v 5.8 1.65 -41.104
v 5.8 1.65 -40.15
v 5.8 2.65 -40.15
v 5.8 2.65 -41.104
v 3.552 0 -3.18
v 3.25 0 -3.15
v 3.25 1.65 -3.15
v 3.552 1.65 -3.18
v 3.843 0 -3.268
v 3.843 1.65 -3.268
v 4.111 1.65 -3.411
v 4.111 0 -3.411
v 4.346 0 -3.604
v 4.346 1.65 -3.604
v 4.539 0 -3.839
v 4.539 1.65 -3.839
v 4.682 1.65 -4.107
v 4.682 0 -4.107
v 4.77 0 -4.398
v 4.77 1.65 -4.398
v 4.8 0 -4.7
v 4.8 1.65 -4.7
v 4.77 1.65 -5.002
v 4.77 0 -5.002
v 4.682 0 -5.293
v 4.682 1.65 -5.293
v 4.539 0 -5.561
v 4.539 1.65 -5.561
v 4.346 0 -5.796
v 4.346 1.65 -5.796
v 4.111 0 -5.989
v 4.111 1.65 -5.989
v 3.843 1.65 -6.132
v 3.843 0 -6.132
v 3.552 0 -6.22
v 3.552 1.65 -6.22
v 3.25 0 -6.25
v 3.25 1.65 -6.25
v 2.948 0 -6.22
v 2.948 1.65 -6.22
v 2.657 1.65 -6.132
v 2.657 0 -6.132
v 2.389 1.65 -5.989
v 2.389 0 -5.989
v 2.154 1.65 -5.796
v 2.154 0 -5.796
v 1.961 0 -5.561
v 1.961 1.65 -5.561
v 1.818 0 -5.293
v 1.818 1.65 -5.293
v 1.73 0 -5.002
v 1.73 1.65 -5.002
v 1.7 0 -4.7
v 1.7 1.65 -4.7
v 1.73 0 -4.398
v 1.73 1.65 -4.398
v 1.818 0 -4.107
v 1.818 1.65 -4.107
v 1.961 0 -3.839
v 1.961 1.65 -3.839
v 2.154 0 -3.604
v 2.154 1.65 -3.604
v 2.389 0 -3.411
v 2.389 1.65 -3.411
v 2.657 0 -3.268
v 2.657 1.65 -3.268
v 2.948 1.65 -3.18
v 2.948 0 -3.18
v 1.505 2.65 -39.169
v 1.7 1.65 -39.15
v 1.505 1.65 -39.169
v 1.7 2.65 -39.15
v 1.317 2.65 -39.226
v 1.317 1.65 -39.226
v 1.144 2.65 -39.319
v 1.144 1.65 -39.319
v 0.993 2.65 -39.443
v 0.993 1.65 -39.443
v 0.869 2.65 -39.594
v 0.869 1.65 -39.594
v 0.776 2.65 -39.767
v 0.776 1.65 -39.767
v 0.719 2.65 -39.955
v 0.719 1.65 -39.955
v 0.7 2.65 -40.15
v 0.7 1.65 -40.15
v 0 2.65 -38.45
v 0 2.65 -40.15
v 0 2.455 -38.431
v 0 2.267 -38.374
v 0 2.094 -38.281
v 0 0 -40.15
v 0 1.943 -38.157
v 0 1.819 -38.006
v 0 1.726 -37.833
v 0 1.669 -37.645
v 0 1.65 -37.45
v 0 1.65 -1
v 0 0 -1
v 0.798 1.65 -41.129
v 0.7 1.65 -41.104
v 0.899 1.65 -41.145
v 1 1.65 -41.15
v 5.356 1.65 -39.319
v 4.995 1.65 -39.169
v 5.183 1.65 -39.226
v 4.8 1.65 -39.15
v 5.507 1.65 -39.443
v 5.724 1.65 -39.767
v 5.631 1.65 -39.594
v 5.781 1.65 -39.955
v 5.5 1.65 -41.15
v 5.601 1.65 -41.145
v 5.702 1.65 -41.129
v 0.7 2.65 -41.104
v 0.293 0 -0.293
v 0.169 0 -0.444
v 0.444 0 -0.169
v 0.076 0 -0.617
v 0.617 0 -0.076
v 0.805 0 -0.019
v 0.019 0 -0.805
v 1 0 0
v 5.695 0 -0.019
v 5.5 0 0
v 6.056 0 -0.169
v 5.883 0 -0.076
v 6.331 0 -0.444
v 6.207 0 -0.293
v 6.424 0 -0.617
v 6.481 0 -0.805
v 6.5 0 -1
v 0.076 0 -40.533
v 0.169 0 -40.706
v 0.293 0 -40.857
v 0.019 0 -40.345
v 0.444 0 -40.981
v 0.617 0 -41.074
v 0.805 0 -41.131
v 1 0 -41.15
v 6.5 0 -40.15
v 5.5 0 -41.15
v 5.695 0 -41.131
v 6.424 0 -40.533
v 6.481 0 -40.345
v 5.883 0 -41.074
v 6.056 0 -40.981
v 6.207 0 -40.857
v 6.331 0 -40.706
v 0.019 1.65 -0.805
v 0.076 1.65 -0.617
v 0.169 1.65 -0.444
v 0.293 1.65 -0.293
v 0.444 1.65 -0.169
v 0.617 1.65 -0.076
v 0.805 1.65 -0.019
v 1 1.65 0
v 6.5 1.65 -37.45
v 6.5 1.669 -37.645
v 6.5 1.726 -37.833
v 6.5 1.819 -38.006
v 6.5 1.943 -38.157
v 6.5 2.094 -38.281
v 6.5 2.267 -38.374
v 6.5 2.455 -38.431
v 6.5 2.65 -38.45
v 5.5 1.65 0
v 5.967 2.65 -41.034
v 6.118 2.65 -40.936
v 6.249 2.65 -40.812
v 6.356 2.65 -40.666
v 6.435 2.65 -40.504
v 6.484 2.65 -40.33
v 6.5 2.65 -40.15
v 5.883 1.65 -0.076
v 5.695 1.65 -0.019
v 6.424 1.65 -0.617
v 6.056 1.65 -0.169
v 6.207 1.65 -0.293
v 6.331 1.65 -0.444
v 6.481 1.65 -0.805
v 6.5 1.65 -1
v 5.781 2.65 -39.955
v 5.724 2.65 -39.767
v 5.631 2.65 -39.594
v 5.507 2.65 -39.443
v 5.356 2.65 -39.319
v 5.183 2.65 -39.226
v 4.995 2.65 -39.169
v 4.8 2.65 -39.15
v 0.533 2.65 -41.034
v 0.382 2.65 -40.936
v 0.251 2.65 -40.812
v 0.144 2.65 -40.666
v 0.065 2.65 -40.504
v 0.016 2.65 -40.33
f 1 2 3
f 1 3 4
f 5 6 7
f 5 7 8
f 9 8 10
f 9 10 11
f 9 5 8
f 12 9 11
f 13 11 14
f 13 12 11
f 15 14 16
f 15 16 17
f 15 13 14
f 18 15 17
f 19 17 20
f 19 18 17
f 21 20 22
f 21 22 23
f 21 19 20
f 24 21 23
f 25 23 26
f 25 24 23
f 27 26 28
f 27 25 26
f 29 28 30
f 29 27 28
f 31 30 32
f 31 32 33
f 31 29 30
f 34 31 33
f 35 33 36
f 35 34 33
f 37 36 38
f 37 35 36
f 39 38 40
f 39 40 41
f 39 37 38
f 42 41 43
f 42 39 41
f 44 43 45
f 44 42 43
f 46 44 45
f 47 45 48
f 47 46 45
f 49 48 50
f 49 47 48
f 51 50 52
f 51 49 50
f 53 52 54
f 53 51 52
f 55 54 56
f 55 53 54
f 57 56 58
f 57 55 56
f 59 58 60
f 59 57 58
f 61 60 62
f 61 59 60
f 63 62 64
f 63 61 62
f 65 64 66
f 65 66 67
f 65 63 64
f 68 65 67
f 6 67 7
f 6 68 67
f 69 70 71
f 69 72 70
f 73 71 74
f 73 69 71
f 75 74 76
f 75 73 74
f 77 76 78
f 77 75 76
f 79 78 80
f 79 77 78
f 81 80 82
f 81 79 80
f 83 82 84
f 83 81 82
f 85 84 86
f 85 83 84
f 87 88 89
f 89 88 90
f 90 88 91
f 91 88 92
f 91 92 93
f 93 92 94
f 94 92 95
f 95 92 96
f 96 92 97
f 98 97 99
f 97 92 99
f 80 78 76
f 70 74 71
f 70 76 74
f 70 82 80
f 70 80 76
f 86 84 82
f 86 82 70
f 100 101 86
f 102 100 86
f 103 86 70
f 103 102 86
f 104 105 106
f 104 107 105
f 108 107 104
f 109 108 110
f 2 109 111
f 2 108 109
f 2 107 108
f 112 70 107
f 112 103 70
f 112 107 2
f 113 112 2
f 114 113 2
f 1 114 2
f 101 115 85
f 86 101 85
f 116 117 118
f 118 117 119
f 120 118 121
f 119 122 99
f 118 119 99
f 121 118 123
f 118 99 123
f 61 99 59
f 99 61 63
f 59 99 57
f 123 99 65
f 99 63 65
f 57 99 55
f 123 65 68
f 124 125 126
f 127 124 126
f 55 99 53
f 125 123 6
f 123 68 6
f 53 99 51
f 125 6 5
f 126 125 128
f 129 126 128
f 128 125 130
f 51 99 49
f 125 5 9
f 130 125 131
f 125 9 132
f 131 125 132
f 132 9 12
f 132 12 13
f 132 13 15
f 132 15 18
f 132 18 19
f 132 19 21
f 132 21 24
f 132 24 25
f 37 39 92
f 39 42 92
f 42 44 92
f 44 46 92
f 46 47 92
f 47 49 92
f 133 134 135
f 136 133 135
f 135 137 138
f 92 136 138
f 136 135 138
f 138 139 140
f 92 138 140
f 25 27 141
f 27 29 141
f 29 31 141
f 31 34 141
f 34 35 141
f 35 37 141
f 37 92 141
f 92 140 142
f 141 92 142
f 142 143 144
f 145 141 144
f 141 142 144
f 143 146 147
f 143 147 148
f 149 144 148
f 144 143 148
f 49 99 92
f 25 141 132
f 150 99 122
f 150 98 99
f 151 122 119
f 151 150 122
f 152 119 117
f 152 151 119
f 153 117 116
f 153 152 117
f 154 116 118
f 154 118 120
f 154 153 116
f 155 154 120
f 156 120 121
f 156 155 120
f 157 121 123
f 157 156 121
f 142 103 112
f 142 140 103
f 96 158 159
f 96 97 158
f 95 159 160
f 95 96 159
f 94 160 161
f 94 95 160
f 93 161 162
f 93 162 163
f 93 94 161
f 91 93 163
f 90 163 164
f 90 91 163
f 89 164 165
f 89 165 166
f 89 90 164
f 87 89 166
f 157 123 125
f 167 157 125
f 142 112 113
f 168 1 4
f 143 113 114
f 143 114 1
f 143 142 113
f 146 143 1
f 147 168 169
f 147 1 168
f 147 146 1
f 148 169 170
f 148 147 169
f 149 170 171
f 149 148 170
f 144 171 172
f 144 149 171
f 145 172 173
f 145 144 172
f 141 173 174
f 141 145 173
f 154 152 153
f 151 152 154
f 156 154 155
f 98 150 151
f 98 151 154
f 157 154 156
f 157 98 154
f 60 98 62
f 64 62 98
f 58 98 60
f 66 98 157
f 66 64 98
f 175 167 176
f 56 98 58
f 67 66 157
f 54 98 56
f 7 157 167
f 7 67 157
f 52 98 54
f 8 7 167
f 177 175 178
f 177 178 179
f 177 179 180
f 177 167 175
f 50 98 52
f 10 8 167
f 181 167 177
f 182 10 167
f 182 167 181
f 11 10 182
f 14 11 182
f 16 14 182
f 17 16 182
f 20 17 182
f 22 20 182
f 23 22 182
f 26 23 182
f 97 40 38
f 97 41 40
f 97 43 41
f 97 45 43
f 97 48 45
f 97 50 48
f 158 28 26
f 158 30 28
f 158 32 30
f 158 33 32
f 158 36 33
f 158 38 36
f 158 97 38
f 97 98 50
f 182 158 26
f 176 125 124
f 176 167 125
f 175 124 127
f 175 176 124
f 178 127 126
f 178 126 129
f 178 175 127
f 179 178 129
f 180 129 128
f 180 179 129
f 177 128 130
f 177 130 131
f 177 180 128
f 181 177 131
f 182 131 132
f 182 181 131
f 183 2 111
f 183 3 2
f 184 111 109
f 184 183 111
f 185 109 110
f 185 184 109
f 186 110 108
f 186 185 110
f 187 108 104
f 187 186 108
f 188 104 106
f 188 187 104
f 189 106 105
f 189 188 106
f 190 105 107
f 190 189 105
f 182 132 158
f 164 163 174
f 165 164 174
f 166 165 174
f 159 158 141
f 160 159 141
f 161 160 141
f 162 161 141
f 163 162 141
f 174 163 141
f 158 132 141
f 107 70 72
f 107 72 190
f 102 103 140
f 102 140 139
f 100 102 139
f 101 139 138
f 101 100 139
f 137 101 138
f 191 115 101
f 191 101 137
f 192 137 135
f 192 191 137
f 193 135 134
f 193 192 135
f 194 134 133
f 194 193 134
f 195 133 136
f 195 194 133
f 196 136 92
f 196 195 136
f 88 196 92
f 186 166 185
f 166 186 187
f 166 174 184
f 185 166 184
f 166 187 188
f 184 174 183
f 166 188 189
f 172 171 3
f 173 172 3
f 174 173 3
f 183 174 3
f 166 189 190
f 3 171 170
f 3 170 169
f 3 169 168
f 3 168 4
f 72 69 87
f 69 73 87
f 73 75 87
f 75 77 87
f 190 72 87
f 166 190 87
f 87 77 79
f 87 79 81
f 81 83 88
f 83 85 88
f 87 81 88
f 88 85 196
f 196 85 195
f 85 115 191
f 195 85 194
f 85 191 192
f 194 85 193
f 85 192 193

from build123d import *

# Parameters (mm, degrees)
SKETCH1_W           = 6.5
SKETCH1_H           = 41.15
SKETCH1_R           = 1.55
BOSS_EXTRUDE1_DEPTH = 1.65
BOSS_EXTRUDE2_DEPTH = 1
FILLET1_R           = 1


with BuildPart() as part:
    # Sketch1 → Boss-Extrude1 (new body)
    with BuildSketch(Plane(origin=(0, 0, 0), x_dir=(1, 0, 0), z_dir=(0, 1, 0))):
        with Locations((3.25, 20.575)):
            Rectangle(SKETCH1_W, SKETCH1_H)
        with Locations(Location((3.25, 4.7, 0), (0, 0, 270))):
            Circle(SKETCH1_R, mode=Mode.SUBTRACT)
    extrude(amount=BOSS_EXTRUDE1_DEPTH)

    # Sketch2 → Boss-Extrude2 (add)
    with BuildSketch(Plane(origin=(0, 1.65, 0), x_dir=(1, 0, 0), z_dir=(0, 1, 0))):
        Polygon((0, 41.15), (0.7, 41.15), (0.7, 39.15), (5.8, 39.15), (5.8, 41.15), (6.5, 41.15), (6.5, 39.15), (6.5, 38.45), (0, 38.45), (0, 39.15), align=None)
    extrude(amount=BOSS_EXTRUDE2_DEPTH)

    # Fillet1
    fillet1_edges = [part.edges().sort_by_distance(p)[0] for p in [
        (6.5, 1.325, -41.15),
        (0, 1.325, -41.15),
        (6.5, 0.825, 0),
        (0, 0.825, 0),
        (3.25, 1.65, -38.45),
        (0.7, 2.15, -39.15),
        (5.8, 2.15, -39.15),
    ]]
    fillet(fillet1_edges, radius=FILLET1_R - 0.0001)  # a hair under: the kernel refuses the full size


solid = part.part
